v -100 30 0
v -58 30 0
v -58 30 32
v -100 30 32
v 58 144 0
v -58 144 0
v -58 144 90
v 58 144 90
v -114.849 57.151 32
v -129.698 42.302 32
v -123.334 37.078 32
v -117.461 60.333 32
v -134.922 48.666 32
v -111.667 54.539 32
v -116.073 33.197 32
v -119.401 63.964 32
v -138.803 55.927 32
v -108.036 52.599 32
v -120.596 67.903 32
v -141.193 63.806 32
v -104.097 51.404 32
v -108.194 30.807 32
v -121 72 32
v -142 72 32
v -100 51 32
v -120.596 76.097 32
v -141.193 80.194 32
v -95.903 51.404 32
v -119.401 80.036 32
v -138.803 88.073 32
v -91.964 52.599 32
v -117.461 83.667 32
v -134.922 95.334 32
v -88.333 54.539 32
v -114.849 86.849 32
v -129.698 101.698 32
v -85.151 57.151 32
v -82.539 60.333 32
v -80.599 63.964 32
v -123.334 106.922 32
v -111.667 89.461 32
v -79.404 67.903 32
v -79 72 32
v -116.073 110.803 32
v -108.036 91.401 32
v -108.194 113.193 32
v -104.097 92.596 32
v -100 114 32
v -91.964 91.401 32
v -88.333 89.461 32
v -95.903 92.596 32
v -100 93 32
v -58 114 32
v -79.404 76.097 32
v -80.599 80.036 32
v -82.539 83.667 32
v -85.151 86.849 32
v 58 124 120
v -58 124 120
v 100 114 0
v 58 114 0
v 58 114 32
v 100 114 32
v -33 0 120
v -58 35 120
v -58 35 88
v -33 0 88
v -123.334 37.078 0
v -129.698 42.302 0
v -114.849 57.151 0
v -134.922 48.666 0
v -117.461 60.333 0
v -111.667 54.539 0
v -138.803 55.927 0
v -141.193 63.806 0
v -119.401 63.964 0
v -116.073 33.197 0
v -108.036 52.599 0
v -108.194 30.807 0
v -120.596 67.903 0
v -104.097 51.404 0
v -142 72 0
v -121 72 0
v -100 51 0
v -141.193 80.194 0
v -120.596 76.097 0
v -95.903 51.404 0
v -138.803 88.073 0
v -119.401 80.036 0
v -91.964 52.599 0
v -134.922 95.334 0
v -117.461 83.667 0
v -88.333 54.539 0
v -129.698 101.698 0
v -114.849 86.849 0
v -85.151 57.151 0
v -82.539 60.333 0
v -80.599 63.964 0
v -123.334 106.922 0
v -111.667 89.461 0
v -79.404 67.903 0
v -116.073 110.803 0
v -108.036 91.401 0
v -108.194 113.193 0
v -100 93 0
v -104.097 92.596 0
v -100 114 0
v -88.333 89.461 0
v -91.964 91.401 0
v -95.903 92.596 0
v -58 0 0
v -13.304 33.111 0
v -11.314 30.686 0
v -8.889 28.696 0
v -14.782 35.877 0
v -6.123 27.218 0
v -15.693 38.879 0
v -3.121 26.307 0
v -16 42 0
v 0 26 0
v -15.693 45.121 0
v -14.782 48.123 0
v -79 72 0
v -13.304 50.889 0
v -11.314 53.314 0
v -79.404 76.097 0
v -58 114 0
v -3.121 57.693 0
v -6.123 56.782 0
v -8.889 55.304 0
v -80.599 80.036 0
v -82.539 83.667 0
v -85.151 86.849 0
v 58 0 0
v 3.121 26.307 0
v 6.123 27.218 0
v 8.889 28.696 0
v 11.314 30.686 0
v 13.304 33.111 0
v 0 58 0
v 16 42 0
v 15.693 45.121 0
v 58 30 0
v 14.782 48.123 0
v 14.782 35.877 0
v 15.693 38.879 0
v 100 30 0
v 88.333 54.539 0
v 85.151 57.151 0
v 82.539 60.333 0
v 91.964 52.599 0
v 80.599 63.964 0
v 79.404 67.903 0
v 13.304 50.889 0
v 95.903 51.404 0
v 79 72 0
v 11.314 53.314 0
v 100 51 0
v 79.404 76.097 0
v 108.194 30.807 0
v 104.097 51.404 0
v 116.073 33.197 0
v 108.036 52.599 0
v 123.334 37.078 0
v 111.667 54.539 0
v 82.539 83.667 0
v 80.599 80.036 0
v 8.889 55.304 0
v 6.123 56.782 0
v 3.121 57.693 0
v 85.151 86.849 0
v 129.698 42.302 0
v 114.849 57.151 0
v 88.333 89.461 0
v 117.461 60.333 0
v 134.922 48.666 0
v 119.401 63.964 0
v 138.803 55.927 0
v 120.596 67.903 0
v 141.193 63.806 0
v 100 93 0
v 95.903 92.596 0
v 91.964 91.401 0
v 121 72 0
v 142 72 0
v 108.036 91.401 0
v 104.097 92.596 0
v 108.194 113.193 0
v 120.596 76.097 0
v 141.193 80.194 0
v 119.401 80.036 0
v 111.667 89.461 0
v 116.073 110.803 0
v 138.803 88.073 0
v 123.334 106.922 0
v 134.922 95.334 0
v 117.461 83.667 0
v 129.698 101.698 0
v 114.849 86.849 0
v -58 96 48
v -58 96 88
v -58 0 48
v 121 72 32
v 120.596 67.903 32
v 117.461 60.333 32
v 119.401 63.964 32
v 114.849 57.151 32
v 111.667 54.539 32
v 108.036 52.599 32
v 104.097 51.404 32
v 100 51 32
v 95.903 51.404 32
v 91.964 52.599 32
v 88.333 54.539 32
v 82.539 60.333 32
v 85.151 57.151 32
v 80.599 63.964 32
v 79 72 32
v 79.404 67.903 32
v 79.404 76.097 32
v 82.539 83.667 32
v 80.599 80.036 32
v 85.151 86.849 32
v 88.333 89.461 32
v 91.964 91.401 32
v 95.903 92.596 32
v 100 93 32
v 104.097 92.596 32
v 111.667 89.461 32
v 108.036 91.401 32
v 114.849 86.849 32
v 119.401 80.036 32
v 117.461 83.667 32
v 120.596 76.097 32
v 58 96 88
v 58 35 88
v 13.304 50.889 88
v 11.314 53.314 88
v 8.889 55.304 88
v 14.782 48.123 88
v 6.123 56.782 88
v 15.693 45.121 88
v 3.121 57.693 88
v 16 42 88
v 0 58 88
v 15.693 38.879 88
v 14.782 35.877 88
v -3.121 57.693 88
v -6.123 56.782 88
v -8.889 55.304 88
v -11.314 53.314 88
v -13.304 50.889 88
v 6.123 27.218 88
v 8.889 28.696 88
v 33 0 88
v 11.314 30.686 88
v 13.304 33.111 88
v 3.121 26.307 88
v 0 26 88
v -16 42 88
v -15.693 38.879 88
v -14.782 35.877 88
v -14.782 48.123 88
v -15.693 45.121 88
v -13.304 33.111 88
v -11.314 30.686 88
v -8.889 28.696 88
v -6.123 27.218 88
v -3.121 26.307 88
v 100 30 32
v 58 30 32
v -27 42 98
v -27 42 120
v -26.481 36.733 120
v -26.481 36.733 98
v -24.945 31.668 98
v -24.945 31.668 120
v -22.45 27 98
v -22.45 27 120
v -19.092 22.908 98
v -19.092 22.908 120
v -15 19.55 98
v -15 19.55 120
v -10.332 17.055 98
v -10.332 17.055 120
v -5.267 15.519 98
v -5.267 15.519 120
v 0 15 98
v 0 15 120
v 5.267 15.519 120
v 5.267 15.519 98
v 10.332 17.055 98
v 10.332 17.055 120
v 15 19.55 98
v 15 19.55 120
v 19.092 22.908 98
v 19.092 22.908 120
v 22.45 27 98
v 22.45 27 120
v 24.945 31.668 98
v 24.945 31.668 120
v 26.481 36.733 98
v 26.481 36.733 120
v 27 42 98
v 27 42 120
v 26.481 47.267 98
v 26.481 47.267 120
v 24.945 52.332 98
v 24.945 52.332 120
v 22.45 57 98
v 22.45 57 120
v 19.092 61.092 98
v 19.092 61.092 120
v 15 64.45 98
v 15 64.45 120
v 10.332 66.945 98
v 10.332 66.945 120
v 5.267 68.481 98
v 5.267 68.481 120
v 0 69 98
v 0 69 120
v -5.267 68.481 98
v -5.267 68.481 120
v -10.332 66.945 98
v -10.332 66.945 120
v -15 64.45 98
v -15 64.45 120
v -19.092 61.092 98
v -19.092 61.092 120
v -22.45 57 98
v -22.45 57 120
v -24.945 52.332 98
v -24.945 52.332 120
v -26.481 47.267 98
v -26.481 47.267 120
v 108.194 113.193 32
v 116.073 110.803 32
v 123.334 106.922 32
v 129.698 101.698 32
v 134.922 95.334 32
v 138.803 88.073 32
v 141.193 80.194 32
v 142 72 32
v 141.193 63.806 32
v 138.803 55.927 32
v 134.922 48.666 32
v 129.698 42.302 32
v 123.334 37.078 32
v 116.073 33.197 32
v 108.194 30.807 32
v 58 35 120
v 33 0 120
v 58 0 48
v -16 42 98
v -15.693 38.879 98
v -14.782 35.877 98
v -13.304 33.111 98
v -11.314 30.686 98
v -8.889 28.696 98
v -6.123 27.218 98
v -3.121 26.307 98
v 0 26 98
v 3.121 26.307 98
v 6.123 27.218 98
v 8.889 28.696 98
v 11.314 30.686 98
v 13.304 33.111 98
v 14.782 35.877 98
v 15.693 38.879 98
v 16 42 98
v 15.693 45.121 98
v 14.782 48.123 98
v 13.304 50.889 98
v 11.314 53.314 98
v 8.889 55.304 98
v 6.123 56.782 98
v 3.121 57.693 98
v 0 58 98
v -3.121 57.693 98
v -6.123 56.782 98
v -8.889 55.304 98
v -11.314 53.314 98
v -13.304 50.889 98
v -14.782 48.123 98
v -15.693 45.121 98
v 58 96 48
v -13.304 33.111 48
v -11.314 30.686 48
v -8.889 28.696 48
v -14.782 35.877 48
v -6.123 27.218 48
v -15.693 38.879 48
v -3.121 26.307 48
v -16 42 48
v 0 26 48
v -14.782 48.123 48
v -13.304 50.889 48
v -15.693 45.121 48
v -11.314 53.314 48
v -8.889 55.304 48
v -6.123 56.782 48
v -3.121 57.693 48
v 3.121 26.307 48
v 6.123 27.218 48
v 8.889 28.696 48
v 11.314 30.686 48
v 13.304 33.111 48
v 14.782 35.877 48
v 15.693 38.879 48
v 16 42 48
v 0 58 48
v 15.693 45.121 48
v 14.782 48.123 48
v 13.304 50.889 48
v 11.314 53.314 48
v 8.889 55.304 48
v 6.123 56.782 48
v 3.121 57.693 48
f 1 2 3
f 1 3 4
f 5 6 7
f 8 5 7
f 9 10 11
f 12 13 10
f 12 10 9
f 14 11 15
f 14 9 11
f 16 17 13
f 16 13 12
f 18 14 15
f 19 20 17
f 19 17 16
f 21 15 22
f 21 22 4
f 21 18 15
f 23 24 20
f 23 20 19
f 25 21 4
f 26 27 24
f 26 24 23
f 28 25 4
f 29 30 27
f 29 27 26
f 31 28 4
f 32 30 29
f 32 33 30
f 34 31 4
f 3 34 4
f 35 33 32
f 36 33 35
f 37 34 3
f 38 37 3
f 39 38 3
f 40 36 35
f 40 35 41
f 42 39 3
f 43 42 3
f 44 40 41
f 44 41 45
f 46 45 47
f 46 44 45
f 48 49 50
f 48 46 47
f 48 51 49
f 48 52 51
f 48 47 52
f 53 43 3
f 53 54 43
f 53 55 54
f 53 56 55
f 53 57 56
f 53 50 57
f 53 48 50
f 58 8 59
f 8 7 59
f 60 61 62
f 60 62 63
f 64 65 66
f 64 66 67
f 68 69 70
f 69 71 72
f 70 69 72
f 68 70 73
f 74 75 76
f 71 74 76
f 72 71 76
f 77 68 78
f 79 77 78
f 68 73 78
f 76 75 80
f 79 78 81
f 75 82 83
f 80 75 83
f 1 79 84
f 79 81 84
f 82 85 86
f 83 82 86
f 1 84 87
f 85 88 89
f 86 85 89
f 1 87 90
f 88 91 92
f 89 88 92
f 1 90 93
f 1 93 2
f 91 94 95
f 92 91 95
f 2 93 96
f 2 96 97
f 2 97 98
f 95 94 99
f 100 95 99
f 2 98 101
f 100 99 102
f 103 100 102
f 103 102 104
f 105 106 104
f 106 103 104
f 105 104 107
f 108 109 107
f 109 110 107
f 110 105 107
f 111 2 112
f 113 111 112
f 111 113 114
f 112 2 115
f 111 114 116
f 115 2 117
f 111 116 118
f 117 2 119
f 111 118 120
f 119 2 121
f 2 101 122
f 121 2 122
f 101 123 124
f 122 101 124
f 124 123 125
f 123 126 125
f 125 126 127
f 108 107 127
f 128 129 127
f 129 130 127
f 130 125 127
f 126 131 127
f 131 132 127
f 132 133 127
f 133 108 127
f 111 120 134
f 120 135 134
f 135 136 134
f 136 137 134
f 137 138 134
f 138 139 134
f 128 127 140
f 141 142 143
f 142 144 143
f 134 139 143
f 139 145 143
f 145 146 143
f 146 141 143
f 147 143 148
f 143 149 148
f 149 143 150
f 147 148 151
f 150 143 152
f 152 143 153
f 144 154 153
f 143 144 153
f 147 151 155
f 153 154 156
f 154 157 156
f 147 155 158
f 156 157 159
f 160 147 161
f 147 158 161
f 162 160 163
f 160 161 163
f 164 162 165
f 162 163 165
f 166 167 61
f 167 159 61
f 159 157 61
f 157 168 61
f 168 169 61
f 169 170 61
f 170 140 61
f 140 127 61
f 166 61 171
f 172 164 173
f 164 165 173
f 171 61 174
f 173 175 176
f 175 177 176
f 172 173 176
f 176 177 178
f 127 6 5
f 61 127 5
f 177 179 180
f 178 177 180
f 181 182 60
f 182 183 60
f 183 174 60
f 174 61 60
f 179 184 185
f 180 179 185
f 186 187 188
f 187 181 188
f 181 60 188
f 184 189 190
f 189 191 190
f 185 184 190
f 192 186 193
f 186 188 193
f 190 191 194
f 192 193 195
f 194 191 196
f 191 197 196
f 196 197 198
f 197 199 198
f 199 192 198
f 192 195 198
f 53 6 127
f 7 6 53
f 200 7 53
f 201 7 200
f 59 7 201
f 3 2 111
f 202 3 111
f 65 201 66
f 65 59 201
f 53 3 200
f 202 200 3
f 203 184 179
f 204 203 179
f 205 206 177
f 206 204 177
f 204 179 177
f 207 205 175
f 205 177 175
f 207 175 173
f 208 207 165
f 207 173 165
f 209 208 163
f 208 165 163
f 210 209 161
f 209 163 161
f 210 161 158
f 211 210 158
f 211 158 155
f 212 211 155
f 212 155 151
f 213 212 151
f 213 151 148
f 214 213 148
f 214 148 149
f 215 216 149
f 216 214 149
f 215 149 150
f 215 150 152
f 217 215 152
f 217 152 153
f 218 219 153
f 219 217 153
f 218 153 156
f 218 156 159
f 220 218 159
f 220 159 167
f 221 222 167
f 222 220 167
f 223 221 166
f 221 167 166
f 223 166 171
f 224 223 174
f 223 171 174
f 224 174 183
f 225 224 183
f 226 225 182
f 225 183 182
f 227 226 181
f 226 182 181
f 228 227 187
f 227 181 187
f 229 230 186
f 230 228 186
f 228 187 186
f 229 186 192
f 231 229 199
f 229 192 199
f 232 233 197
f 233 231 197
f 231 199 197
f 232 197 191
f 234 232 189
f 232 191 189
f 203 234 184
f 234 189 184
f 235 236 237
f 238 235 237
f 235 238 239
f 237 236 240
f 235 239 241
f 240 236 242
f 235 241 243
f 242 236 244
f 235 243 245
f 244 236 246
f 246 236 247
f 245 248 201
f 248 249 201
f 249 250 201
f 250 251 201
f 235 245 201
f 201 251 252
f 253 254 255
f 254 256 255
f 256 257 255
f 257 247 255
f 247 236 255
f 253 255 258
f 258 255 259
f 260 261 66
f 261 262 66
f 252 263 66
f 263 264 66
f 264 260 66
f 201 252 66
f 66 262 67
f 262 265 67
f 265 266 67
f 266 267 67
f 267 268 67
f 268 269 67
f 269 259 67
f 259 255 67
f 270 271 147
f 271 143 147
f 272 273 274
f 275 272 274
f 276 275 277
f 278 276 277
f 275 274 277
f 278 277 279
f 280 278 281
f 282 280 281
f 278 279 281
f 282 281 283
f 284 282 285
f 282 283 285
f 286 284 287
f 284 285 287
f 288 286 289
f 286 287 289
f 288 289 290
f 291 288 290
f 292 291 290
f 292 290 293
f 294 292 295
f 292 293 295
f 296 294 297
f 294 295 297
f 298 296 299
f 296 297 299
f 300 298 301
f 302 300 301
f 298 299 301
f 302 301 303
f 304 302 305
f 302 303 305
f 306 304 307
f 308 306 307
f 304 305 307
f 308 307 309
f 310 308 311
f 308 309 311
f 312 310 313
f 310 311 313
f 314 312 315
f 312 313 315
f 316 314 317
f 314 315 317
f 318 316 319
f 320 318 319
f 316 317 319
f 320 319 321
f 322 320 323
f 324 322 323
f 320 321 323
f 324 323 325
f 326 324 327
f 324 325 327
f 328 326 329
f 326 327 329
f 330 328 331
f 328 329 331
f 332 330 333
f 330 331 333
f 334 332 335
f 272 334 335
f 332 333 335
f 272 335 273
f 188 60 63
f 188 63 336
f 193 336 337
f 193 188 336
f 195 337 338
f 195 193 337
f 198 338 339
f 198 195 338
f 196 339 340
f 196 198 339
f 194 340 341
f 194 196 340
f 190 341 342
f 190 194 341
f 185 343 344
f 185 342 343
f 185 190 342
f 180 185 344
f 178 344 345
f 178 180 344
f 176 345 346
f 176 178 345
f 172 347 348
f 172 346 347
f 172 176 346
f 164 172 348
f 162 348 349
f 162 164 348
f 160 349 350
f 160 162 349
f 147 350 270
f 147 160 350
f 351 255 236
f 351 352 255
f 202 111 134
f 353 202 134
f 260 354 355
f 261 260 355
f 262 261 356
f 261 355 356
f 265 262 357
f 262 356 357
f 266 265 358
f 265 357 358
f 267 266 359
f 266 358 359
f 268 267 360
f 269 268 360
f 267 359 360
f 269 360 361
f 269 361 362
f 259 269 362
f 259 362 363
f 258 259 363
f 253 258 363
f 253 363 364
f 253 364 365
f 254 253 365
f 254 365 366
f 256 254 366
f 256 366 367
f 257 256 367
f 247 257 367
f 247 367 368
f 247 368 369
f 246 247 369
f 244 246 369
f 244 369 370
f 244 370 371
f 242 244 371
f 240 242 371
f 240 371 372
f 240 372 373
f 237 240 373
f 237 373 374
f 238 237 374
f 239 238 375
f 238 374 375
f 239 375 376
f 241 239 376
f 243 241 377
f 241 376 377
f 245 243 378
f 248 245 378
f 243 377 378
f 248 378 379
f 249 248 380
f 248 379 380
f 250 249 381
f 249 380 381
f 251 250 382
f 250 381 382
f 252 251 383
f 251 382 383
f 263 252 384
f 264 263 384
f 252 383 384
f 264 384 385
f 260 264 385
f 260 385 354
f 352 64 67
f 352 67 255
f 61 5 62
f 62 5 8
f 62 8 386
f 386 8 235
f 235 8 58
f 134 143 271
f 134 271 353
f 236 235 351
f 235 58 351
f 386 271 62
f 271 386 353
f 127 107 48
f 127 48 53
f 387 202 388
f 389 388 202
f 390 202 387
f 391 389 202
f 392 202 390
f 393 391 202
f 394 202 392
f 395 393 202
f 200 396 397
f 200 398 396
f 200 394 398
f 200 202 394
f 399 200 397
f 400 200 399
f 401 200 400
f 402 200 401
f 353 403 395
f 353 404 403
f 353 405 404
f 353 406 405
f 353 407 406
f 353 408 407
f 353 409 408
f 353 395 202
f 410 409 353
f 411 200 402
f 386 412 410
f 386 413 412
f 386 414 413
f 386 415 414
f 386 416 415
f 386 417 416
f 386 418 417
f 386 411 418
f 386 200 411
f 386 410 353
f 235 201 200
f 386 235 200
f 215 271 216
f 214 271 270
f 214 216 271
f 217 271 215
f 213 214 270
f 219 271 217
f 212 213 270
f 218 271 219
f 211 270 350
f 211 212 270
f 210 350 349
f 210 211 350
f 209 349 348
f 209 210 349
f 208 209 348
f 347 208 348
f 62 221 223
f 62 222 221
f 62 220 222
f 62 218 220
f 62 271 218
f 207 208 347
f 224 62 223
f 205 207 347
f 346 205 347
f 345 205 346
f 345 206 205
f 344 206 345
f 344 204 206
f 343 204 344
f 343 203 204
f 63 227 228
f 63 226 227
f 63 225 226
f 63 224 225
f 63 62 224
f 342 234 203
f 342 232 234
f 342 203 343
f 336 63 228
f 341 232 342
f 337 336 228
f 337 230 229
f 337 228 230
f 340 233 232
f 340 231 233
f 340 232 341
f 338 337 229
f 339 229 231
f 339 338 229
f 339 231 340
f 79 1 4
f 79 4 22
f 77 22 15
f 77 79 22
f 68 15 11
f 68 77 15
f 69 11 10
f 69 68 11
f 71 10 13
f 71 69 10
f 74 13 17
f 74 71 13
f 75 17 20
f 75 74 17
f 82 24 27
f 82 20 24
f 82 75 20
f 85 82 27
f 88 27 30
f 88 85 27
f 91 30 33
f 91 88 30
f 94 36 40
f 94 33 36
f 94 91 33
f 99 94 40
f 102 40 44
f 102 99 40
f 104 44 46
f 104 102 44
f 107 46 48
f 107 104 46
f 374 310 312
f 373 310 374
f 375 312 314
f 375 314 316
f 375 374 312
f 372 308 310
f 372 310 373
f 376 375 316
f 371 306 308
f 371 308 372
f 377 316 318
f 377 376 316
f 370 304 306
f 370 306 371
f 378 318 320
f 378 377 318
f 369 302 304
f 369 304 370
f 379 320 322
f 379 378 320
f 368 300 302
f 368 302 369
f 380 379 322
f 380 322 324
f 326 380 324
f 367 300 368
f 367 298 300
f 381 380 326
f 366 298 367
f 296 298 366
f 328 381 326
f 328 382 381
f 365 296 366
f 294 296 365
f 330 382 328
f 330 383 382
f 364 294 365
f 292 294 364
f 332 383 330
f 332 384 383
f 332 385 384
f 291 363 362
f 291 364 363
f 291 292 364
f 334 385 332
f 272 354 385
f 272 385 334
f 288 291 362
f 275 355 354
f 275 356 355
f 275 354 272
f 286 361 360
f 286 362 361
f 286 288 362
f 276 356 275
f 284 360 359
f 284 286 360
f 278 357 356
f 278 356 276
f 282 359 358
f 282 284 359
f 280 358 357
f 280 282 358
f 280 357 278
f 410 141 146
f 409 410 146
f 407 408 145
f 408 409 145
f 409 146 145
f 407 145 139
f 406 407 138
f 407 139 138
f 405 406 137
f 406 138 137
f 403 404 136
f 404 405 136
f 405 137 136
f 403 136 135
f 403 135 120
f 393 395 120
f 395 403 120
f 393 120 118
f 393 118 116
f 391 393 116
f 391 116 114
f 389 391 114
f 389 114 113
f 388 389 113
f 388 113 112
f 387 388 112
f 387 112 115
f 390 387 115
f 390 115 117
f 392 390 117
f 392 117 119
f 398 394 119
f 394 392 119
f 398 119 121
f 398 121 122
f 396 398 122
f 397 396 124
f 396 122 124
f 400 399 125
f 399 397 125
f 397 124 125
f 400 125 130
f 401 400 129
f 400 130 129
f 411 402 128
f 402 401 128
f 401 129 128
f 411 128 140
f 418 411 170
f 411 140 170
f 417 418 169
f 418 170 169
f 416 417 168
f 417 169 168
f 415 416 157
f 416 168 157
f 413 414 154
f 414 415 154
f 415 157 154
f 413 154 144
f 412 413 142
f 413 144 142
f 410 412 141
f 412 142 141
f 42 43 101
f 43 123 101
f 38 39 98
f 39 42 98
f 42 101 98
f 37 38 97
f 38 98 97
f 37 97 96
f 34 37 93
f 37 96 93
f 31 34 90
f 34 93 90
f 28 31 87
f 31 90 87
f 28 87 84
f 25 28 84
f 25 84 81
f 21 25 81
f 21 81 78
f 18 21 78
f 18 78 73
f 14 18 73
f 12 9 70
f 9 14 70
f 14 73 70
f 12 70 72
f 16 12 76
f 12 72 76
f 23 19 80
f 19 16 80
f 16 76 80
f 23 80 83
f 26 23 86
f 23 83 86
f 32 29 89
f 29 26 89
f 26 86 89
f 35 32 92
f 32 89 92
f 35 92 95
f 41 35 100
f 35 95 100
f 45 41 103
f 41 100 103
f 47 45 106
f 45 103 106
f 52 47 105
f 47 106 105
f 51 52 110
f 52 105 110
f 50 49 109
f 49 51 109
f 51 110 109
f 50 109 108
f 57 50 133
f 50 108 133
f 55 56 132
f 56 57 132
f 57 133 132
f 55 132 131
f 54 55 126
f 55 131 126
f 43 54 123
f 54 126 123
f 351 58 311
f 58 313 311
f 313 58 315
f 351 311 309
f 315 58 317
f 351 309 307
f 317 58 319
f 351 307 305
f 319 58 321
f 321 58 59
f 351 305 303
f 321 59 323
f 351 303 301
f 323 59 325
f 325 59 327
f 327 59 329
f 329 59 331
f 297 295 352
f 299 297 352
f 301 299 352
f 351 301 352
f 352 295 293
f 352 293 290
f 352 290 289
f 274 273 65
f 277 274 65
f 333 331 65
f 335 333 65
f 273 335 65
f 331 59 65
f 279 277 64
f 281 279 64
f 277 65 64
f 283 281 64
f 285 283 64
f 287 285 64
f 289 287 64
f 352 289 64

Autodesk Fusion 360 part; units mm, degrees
sketch "草图1" plane through (0, 0, 0) normal (0, 0, 1) x (1, 0, 0)
  line L0 (-125, 0) -> (125, 0) construction
  line L1 (0, -50) -> (0, 50) construction
  line L2 (-58, 0) -> (58, 0)
  line L3 (58, 30) -> (58, 0)
  line L4 (58, 30) -> (100, 30)
  line L5 (-58, 0) -> (-58, 30)
  line L6 (-58, 30) -> (-100, 30)
  circle A0 centre (-100, 72) radius 21
  circle A1 centre (100, 72) radius 21
  circle A2 centre (0, 42) radius 16
  line L7 (-100, 114) -> (-58, 114)
  line L8 (-58, 114) -> (-58, 144)
  line L9 (-58, 144) -> (58, 144)
  line L10 (58, 144) -> (58, 114)
  line L11 (58, 114) -> (100, 114)
  arc A3 (100, 30) -> (100, 114) centre (100, 72) ccw
  arc A4 (-100, 114) -> (-100, 30) centre (-100, 72) ccw
  line L12 (-58, 114) -> (-58, 30)
  line L13 (58, 114) -> (58, 30)
  dimension "d1" = 116
  dimension "d2" = 144
  dimension "d3" = 72
  dimension "d4" = 200
  dimension "d5" = 84
  dimension "d6" = 42
  dimension "d7" = 32
  dimension "d8" = 42
extrude "拉伸1" add sketch "草图1" along normal blind 32 contours L6 L7 A4 L12 | L4 L11 A3 L13 makes body 1 at (65, 72, 0) makes body 2 at (-65, 72, 0)
extrude "拉伸2" add sketch "草图1" along normal blind 48 contours L2 L3 L5 L8 L9 L10 L12 L13 bodies 1 2
sketch "草图2" plane through (-58, 0, 0) normal (-1, 0, 0) x (0, -1, 0)
  line L0 (-114, 0) -> (-114, 32)
  line L1 (-114, 32) -> (-30, 32)
  line L2 (-30, 32) -> (-30, 0)
  line L3 (-30, 0) -> (0, 0)
  line L4 (0, 0) -> (0, 48)
  line L5 (0, 48) -> (-144, 48)
  line L6 (-144, 48) -> (-144, 0)
  line L7 (-144, 0) -> (-114, 0)
  line L8 (-144, 48) -> (-144, 50)
  line L9 (-144, 50) -> (-144, 90)
  line L10 (-144, 90) -> (-124, 120)
  line L11 (-124, 120) -> (-96, 120)
  line L12 (-96, 120) -> (-96, 48)
  line L13 (-144, 48) -> (-96, 48)
  point P0 (-144, 0)
  dimension "d13" = 20
  dimension "d14" = 30
  dimension "d15" = 96
  dimension "d16" = 120
extrude "拉伸3" add sketch "草图2" against normal blind 116 contours L5 L8 L9 L10 L11 L12 L13 bodies 1
sketch "草图3" plane through (0, 0, 120) normal (0, 0, 1) x (-1, 0, 0)
  line L0 (58, -124) -> (58, -96)
  line L1 (58, -96) -> (-58, -96)
  line L2 (-58, -96) -> (-58, -124)
  line L3 (-58, -124) -> (58, -124)
  line L4 (0, -180) -> (0, 50) construction
  line L5 (58, -96) -> (58, -35)
  line L6 (58, -35) -> (33, 0)
  line L7 (33, 0) -> (-33, 0)
  line L8 (-33, 0) -> (-58, -35)
  line L9 (-58, -35) -> (-58, -96)
  line L10 (58, -96) -> (-58, -96)
  circle A0 centre (0, -42) radius 27
  circle A1 centre (0, -42) radius 16
  line L11 (100, 0) -> (-125.4385, 0) construction
  dimension "d19" = 116
  dimension "d20" = 66
  dimension "d21" = 35
  dimension "d22" = 54
  dimension "d23" = 32
  dimension "d25" = 42
extrude "拉伸4" add sketch "草图3" against normal blind 32 contours L1 L5 L6 L7 L8 L9 L10 | A0 bodies 1
extrude "拉伸5" cut sketch "草图3" against normal blind 22 contours A0 bodies 1
equation "d5 = ( 42 * 2 ) * 1 mm"
